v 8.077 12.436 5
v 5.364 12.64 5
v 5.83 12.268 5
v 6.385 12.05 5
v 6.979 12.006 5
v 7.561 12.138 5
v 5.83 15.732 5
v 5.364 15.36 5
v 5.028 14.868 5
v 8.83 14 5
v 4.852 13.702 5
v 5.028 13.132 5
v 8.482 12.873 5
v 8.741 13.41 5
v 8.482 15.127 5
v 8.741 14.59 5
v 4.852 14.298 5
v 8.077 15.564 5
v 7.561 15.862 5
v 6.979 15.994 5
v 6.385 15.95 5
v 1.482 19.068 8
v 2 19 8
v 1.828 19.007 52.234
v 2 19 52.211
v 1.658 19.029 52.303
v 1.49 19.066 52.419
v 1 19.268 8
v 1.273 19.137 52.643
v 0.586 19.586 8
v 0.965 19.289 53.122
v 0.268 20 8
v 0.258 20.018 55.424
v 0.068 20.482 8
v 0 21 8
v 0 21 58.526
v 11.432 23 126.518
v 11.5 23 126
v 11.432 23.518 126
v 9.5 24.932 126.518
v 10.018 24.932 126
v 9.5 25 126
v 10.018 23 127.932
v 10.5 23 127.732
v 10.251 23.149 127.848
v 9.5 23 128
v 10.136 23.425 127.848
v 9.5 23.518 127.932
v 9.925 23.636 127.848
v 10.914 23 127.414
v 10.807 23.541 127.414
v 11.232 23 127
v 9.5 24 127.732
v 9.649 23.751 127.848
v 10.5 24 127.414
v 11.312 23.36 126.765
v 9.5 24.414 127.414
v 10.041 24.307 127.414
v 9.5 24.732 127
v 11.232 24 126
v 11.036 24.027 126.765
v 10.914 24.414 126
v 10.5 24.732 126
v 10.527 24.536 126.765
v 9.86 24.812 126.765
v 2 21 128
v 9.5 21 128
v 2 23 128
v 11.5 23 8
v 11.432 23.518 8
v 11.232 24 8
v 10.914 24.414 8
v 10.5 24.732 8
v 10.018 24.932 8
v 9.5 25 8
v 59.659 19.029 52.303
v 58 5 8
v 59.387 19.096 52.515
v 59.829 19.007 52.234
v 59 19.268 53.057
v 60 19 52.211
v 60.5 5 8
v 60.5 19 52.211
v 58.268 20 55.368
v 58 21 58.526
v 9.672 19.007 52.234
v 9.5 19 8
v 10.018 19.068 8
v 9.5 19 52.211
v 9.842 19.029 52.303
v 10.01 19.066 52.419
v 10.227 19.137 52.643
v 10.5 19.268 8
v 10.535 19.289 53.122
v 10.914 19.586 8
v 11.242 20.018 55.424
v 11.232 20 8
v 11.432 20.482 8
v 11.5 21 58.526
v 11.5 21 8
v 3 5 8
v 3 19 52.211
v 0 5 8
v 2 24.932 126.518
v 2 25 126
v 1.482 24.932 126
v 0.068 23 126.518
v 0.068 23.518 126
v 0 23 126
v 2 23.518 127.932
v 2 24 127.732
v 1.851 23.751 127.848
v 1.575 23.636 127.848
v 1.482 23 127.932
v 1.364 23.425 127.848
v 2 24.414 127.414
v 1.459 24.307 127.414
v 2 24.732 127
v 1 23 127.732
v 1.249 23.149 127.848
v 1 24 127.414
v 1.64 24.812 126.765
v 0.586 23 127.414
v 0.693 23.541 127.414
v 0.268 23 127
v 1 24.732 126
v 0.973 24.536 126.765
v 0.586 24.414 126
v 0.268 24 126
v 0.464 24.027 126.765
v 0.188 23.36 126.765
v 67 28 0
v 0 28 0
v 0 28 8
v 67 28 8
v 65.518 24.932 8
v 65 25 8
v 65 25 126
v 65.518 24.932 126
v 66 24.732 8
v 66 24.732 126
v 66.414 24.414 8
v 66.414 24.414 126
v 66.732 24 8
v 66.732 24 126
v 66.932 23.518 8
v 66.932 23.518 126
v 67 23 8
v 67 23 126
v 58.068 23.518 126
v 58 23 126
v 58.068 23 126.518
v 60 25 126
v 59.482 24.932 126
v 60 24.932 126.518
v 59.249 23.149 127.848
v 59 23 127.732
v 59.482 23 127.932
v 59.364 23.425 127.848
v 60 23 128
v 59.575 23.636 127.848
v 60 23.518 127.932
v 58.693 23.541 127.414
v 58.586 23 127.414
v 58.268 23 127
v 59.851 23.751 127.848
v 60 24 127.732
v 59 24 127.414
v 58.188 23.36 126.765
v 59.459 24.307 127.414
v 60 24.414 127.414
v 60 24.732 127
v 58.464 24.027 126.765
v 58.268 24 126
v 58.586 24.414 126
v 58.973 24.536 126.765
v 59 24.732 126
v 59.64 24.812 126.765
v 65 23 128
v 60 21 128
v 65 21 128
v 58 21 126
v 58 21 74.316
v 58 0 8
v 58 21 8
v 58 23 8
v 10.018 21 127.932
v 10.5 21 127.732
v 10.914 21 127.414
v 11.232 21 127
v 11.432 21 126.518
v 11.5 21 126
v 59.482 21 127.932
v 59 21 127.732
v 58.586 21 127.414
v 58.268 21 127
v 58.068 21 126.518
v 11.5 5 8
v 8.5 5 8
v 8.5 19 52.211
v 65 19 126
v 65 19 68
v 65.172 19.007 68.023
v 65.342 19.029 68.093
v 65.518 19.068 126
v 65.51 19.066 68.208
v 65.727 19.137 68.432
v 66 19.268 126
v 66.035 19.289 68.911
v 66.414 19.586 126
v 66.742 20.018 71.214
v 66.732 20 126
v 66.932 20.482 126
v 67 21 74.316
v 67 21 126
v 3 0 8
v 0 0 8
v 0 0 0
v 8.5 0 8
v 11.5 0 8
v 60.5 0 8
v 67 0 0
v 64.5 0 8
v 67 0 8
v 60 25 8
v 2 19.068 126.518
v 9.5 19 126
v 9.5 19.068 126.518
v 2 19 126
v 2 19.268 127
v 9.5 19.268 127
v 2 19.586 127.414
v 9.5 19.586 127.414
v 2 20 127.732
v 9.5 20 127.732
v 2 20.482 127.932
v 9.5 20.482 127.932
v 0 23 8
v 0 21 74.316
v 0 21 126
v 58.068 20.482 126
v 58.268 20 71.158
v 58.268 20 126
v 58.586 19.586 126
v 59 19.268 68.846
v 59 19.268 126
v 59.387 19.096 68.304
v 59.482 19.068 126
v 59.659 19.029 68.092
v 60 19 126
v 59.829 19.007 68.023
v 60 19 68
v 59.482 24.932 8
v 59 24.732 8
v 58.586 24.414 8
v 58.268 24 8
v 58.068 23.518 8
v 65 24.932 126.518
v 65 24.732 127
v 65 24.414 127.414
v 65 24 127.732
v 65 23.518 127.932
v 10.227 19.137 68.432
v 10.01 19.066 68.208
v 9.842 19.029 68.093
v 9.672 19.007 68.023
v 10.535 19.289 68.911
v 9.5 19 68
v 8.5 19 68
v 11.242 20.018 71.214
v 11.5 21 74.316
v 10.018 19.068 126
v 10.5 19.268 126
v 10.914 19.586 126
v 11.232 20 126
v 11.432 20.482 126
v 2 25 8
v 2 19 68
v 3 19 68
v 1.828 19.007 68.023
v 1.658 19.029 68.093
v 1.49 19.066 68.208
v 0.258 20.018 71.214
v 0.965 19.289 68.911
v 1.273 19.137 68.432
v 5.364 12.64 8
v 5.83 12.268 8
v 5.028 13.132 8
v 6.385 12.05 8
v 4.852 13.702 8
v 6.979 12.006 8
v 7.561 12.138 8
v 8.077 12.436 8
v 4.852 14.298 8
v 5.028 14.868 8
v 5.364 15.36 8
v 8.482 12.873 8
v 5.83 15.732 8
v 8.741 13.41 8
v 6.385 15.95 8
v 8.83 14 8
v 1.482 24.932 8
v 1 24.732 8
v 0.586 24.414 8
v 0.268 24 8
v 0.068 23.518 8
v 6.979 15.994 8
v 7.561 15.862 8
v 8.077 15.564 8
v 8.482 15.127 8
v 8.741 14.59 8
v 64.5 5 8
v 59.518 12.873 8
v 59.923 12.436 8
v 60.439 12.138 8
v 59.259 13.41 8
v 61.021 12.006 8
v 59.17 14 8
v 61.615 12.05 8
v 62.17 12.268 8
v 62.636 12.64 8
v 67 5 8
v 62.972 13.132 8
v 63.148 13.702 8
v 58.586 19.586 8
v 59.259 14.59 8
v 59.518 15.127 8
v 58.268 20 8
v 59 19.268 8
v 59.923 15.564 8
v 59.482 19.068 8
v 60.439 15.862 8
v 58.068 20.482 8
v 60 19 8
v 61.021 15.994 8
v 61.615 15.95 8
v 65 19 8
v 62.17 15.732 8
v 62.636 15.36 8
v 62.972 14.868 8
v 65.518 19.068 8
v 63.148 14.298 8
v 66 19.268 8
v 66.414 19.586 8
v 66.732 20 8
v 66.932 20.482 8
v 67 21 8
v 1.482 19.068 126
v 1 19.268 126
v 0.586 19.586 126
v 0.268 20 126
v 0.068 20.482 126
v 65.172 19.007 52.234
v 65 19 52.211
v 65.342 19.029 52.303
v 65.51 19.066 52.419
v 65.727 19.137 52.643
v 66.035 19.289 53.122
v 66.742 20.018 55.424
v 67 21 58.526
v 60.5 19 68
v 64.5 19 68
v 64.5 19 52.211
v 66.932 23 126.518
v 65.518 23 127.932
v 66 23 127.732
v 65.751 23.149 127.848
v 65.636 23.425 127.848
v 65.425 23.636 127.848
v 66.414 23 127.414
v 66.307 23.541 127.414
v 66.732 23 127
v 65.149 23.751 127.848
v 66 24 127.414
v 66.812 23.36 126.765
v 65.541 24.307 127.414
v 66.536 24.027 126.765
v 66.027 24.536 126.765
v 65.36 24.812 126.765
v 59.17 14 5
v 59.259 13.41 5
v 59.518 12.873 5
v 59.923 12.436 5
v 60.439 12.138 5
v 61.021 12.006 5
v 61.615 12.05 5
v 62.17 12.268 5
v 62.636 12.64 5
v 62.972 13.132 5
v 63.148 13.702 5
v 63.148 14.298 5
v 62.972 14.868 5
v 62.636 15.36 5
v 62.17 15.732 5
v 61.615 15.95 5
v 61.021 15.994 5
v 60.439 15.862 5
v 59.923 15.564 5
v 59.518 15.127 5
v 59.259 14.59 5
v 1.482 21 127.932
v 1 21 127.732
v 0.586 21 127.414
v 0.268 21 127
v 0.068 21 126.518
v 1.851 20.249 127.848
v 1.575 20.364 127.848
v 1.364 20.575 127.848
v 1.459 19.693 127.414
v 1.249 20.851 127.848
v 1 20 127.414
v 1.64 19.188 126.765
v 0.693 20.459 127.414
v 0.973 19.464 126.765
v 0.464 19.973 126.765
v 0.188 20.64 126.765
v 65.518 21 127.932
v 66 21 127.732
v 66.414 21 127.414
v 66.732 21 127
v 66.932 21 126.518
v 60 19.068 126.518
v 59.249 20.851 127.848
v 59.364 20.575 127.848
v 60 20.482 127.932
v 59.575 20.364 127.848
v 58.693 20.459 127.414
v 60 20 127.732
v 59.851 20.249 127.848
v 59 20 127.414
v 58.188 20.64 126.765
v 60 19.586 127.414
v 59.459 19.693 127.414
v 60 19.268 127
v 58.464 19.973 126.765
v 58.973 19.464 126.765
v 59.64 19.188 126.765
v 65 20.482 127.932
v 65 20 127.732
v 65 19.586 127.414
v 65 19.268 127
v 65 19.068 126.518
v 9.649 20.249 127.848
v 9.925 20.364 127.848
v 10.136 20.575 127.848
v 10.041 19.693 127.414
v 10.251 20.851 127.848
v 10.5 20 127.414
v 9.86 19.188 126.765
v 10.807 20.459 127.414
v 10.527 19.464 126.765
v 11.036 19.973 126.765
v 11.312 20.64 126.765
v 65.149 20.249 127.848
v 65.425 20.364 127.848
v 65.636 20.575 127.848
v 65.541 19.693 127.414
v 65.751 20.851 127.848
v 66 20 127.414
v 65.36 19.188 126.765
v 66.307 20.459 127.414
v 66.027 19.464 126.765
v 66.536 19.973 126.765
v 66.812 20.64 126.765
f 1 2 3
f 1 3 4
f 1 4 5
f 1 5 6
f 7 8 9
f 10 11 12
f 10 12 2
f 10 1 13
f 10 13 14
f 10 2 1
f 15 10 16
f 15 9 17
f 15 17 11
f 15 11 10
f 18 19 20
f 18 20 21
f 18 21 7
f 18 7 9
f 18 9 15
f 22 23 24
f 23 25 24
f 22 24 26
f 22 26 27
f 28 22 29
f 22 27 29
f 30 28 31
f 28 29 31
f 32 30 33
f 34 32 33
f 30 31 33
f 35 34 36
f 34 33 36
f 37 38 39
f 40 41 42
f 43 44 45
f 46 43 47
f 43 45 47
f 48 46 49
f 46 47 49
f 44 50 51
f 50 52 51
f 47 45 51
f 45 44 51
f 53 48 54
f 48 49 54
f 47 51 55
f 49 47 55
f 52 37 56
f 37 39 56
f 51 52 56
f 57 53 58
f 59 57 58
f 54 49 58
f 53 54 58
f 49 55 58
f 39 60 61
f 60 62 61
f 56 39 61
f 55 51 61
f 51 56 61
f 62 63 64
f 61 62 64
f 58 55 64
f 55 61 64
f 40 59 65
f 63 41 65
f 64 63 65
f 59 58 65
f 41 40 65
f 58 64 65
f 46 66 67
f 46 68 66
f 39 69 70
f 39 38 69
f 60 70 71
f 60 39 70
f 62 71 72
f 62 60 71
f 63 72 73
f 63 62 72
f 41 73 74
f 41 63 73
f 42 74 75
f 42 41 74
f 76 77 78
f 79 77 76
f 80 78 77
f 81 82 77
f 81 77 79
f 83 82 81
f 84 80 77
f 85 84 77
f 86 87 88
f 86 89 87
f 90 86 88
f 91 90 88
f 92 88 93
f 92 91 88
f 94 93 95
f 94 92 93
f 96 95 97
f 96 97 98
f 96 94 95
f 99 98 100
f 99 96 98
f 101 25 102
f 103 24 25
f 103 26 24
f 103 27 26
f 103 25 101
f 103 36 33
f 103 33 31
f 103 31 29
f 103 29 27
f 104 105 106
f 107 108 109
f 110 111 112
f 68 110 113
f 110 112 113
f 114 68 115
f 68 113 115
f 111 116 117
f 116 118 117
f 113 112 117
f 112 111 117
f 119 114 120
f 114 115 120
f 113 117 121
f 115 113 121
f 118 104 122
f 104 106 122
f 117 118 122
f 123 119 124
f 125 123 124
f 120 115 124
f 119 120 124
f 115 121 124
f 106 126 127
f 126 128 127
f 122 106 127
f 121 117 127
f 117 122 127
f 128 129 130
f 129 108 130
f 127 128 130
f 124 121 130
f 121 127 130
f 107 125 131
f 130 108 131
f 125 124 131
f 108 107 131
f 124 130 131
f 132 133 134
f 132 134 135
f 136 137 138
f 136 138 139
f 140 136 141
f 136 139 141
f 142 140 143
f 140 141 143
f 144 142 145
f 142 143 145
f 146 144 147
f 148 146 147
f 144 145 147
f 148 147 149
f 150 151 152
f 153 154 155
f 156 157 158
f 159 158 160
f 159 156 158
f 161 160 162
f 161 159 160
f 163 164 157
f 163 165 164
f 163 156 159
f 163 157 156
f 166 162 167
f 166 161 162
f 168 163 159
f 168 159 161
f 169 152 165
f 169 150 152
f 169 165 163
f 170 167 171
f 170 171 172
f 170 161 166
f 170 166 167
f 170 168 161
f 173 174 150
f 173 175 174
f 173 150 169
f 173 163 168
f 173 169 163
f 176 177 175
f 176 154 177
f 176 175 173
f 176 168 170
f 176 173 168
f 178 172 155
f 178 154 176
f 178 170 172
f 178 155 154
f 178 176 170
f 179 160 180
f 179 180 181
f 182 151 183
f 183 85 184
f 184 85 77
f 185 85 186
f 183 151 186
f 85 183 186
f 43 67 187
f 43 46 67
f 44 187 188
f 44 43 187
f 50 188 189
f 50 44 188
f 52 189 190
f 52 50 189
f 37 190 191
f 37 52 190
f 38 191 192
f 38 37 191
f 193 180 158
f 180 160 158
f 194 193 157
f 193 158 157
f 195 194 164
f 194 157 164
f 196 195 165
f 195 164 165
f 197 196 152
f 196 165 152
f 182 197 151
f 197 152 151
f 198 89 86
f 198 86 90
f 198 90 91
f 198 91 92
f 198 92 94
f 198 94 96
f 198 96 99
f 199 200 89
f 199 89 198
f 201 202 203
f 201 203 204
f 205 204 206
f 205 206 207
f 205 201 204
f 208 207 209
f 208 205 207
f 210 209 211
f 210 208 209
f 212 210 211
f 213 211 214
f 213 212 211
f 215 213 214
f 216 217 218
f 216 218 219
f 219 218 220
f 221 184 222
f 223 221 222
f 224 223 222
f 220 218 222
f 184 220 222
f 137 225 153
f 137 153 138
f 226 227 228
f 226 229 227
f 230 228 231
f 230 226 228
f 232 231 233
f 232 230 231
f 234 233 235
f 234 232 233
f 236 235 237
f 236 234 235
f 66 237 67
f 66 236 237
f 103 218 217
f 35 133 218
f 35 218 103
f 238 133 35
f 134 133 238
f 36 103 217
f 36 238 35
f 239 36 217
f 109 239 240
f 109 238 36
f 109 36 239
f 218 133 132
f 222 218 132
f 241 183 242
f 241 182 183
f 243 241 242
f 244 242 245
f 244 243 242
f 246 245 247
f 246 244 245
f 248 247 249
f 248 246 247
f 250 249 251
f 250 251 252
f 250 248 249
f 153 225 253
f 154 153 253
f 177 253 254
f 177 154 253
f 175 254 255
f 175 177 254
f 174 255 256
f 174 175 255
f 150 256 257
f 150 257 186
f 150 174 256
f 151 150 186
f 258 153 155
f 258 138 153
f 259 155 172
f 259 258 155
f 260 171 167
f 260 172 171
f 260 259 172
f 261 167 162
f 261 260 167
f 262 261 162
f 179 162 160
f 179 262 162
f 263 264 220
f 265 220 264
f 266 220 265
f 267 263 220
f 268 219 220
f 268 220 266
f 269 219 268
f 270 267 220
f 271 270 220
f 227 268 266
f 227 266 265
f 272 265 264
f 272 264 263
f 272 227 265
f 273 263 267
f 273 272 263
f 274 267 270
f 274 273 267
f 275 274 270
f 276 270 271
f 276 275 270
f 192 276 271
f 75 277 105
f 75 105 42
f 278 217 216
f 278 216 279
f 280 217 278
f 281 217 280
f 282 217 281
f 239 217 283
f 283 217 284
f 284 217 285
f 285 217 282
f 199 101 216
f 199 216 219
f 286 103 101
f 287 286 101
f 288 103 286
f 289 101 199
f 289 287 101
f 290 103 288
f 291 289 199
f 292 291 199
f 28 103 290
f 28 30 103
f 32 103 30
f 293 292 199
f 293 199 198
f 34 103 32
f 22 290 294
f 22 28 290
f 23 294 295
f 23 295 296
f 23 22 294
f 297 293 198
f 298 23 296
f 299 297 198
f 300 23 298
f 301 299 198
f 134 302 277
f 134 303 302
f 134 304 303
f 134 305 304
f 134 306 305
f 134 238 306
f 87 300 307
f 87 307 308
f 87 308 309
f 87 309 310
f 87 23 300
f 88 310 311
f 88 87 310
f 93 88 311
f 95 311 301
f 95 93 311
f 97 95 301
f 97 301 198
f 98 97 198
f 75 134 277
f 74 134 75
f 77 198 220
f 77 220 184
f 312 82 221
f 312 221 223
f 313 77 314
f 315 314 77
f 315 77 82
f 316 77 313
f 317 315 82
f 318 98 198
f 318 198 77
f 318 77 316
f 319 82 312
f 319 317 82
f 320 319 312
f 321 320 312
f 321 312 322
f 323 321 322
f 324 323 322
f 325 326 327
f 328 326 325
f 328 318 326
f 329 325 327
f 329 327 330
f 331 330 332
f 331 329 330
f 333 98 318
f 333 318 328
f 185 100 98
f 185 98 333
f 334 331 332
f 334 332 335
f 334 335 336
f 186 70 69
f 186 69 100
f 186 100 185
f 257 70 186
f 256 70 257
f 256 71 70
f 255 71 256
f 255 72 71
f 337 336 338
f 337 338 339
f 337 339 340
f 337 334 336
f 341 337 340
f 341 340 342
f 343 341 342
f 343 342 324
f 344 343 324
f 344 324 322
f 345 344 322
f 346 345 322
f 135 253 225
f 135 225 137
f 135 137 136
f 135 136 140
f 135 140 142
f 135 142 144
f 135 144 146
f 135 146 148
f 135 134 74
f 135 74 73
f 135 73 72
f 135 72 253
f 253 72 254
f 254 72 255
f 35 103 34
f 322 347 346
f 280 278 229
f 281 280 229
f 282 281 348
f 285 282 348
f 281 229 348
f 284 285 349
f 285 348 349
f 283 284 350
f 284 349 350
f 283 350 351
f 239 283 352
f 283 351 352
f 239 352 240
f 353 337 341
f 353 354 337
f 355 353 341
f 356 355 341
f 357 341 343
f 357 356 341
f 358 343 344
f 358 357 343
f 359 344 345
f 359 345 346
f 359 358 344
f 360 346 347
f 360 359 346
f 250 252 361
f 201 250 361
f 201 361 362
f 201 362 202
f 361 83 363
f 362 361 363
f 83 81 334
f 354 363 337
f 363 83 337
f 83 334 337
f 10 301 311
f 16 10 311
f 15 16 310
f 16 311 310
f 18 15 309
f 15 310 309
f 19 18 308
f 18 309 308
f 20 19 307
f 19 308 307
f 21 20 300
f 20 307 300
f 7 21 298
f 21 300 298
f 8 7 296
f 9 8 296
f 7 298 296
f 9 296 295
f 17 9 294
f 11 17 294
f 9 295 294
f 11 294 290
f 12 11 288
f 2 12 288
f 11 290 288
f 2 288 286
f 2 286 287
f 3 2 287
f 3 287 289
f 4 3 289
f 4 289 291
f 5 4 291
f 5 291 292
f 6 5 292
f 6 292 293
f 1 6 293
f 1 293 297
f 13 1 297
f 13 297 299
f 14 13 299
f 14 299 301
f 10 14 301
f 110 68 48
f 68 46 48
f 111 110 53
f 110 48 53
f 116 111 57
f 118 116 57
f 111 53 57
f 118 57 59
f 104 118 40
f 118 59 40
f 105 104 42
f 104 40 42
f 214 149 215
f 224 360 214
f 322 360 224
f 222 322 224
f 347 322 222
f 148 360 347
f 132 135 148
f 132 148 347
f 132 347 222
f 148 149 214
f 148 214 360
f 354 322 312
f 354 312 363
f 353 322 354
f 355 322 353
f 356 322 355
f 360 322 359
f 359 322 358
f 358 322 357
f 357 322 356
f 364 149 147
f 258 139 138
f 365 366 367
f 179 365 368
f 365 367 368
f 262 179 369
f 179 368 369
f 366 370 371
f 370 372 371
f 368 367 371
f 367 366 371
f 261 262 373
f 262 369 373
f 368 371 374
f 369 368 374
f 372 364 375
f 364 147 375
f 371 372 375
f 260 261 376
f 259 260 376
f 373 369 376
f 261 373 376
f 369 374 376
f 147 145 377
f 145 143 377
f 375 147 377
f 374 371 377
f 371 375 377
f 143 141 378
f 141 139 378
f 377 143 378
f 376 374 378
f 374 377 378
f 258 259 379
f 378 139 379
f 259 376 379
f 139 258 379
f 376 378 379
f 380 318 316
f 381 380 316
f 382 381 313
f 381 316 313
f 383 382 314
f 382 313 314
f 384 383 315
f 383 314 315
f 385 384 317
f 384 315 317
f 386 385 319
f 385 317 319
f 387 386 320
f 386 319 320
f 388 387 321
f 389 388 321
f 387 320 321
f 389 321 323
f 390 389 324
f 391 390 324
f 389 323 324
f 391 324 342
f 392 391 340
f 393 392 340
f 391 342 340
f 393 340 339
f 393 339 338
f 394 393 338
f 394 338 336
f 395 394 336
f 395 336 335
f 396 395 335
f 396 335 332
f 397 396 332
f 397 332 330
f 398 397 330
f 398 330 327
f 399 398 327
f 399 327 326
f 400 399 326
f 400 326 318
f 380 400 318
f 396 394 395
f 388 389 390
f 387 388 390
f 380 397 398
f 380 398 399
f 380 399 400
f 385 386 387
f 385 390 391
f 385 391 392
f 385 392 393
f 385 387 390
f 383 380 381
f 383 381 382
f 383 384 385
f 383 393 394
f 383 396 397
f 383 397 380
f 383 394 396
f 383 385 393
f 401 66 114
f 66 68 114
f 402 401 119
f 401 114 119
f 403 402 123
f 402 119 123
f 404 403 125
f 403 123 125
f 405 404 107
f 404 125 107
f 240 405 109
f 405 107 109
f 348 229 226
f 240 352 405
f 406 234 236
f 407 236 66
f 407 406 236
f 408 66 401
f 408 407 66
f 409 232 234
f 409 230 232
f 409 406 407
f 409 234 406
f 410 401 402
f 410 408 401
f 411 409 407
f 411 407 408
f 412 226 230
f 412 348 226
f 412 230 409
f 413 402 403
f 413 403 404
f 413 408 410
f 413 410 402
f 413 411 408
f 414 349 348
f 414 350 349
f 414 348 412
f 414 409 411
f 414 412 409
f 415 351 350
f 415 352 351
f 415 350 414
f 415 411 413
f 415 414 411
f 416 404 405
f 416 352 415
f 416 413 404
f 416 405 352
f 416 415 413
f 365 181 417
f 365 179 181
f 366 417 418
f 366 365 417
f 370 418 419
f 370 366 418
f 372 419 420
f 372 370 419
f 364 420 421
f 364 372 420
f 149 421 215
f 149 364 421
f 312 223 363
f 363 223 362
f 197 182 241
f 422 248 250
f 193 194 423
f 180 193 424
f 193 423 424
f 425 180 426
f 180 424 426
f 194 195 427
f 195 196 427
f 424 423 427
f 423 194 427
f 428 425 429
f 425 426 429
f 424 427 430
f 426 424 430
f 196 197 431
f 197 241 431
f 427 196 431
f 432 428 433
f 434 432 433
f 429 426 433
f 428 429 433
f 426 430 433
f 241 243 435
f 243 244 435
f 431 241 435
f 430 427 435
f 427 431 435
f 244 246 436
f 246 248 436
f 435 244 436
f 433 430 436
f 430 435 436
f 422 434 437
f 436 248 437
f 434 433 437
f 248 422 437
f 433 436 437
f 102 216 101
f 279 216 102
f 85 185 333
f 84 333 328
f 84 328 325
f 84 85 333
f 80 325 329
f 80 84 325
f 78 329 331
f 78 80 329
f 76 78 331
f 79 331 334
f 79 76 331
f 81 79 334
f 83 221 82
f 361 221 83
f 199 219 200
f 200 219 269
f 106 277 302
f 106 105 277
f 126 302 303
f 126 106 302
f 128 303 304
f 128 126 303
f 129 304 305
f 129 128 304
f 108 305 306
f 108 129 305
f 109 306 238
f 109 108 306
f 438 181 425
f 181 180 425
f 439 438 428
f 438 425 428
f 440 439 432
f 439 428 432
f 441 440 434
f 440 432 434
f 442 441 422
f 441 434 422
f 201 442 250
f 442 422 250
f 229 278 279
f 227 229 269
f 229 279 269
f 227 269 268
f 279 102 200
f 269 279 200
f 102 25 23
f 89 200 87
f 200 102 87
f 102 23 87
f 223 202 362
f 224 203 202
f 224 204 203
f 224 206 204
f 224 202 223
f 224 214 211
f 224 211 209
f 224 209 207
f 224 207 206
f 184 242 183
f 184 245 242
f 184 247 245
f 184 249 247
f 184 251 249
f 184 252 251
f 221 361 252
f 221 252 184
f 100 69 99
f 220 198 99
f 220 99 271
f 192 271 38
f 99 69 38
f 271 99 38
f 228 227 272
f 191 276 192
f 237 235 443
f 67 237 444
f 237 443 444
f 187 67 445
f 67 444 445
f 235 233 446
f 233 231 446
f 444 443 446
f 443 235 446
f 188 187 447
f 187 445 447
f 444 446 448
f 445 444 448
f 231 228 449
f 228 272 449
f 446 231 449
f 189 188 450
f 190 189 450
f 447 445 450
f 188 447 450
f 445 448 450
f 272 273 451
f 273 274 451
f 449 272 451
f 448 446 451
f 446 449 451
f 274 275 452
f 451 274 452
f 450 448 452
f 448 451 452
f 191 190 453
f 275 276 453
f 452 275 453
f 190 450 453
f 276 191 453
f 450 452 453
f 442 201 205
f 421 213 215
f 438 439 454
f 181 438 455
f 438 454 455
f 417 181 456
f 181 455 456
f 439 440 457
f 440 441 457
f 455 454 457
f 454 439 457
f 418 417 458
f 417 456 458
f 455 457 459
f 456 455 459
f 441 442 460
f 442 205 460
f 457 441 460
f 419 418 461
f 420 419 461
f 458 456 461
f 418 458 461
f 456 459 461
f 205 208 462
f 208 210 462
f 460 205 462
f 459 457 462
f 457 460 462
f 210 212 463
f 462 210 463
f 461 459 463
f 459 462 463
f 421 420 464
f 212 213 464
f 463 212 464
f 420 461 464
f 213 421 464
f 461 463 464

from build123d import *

# Parameters (mm, degrees)
ESQUISSE1_W             = 67
ESQUISSE1_H             = 28
BOSS_EXTRU_1_DEPTH      = 8
ESQUISSE2_W             = 11.5
ESQUISSE2_H             = 6
ESQUISSE2_W_2           = 9
BOSS_EXTRU_2_DEPTH      = 120
ESQUISSE4_R             = 2
ENL_V_MAT_EXTRU_2_DEPTH = 3
BOSS_EXTRU_3_DEPTH      = 11.5
ESQUISSE7_W             = 5.5
ESQUISSE7_H             = 19
ENL_V_MAT_EXTRU_3_DEPTH = 120
BOSS_EXTRU_4_DEPTH      = 9
ESQUISSE9_W             = 4
ESQUISSE9_H             = 19
ENL_V_MAT_EXTRU_4_DEPTH = 120
CONG_2_R                = 2


with BuildPart() as part:
    # Esquisse1 → Boss.-Extru.1 (new body)
    with BuildSketch(Plane.XY):
        with Locations((33.5, 14)):
            Rectangle(ESQUISSE1_W, ESQUISSE1_H)
    extrude(amount=BOSS_EXTRU_1_DEPTH)

    # Esquisse2 → Boss.-Extru.2 (add)
    with BuildSketch(Plane.XY.offset(8)):
        with Locations((5.75, 22)):
            Rectangle(ESQUISSE2_W, ESQUISSE2_H)
        with Locations((62.5, 22)):
            Rectangle(ESQUISSE2_W_2, ESQUISSE2_H)
    extrude(amount=BOSS_EXTRU_2_DEPTH)

    # Esquisse4 → Enlèv. mat.-Extru.2 (cut)
    with BuildSketch(Plane.XY.offset(8)):
        with Locations((6.83, 14)):
            Circle(ESQUISSE4_R)
        with Locations(Location((61.17, 14, 0), (0, 0, 180))):
            Circle(ESQUISSE4_R)
    extrude(amount=-ENL_V_MAT_EXTRU_2_DEPTH, mode=Mode.SUBTRACT)

    # Esquisse5 → Boss.-Extru.3 (add)
    with BuildSketch(Plane.ZY):
        Polygon((8, 0), (68, 19), (52.210526316, 19), (8, 5), align=None)
    extrude(amount=-BOSS_EXTRU_3_DEPTH)

    # Esquisse7 → Enlèv. mat.-Extru.3 (cut)
    with BuildSketch(Plane.XY.offset(128)):
        with Locations((5.75, 9.5)):
            Rectangle(ESQUISSE7_W, ESQUISSE7_H)
    extrude(amount=-ENL_V_MAT_EXTRU_3_DEPTH, mode=Mode.SUBTRACT)

    # Esquisse8 → Boss.-Extru.4 (add)
    with BuildSketch(Plane(origin=(67, 0, 0), x_dir=(0, 0, -1), z_dir=(1, 0, 0))):
        Polygon((-8, 0), (-8, 5), (-52.210526316, 19), (-68, 19), align=None)
    extrude(amount=-BOSS_EXTRU_4_DEPTH)

    # Esquisse9 → Enlèv. mat.-Extru.4 (cut)
    with BuildSketch(Plane.XY.offset(128)):
        with Locations((62.5, 9.5)):
            Rectangle(ESQUISSE9_W, ESQUISSE9_H)
    extrude(amount=-ENL_V_MAT_EXTRU_4_DEPTH, mode=Mode.SUBTRACT)

    # Congé2
    cong_2_edges = [part.edges().sort_by_distance(p)[0] for p in [
        (67, 19, 30.105263158),
        (58, 19, 30.105263158),
        (58, 25, 68),
        (58, 19, 98),
        (67, 19, 98),
        (67, 25, 68),
        (58, 22, 128),
        (62.5, 19, 128),
        (67, 22, 128),
        (62.5, 25, 128),
        (0, 19, 98),
        (11.5, 19, 98),
        (11.5, 25, 68),
        (0, 25, 68),
        (5.75, 19, 128),
        (11.5, 22, 128),
        (5.75, 25, 128),
        (0, 22, 128),
        (11.5, 19, 30.105263158),
        (0, 19, 30.105263158),
    ]]
    fillet(cong_2_edges, radius=CONG_2_R)


solid = part.part
